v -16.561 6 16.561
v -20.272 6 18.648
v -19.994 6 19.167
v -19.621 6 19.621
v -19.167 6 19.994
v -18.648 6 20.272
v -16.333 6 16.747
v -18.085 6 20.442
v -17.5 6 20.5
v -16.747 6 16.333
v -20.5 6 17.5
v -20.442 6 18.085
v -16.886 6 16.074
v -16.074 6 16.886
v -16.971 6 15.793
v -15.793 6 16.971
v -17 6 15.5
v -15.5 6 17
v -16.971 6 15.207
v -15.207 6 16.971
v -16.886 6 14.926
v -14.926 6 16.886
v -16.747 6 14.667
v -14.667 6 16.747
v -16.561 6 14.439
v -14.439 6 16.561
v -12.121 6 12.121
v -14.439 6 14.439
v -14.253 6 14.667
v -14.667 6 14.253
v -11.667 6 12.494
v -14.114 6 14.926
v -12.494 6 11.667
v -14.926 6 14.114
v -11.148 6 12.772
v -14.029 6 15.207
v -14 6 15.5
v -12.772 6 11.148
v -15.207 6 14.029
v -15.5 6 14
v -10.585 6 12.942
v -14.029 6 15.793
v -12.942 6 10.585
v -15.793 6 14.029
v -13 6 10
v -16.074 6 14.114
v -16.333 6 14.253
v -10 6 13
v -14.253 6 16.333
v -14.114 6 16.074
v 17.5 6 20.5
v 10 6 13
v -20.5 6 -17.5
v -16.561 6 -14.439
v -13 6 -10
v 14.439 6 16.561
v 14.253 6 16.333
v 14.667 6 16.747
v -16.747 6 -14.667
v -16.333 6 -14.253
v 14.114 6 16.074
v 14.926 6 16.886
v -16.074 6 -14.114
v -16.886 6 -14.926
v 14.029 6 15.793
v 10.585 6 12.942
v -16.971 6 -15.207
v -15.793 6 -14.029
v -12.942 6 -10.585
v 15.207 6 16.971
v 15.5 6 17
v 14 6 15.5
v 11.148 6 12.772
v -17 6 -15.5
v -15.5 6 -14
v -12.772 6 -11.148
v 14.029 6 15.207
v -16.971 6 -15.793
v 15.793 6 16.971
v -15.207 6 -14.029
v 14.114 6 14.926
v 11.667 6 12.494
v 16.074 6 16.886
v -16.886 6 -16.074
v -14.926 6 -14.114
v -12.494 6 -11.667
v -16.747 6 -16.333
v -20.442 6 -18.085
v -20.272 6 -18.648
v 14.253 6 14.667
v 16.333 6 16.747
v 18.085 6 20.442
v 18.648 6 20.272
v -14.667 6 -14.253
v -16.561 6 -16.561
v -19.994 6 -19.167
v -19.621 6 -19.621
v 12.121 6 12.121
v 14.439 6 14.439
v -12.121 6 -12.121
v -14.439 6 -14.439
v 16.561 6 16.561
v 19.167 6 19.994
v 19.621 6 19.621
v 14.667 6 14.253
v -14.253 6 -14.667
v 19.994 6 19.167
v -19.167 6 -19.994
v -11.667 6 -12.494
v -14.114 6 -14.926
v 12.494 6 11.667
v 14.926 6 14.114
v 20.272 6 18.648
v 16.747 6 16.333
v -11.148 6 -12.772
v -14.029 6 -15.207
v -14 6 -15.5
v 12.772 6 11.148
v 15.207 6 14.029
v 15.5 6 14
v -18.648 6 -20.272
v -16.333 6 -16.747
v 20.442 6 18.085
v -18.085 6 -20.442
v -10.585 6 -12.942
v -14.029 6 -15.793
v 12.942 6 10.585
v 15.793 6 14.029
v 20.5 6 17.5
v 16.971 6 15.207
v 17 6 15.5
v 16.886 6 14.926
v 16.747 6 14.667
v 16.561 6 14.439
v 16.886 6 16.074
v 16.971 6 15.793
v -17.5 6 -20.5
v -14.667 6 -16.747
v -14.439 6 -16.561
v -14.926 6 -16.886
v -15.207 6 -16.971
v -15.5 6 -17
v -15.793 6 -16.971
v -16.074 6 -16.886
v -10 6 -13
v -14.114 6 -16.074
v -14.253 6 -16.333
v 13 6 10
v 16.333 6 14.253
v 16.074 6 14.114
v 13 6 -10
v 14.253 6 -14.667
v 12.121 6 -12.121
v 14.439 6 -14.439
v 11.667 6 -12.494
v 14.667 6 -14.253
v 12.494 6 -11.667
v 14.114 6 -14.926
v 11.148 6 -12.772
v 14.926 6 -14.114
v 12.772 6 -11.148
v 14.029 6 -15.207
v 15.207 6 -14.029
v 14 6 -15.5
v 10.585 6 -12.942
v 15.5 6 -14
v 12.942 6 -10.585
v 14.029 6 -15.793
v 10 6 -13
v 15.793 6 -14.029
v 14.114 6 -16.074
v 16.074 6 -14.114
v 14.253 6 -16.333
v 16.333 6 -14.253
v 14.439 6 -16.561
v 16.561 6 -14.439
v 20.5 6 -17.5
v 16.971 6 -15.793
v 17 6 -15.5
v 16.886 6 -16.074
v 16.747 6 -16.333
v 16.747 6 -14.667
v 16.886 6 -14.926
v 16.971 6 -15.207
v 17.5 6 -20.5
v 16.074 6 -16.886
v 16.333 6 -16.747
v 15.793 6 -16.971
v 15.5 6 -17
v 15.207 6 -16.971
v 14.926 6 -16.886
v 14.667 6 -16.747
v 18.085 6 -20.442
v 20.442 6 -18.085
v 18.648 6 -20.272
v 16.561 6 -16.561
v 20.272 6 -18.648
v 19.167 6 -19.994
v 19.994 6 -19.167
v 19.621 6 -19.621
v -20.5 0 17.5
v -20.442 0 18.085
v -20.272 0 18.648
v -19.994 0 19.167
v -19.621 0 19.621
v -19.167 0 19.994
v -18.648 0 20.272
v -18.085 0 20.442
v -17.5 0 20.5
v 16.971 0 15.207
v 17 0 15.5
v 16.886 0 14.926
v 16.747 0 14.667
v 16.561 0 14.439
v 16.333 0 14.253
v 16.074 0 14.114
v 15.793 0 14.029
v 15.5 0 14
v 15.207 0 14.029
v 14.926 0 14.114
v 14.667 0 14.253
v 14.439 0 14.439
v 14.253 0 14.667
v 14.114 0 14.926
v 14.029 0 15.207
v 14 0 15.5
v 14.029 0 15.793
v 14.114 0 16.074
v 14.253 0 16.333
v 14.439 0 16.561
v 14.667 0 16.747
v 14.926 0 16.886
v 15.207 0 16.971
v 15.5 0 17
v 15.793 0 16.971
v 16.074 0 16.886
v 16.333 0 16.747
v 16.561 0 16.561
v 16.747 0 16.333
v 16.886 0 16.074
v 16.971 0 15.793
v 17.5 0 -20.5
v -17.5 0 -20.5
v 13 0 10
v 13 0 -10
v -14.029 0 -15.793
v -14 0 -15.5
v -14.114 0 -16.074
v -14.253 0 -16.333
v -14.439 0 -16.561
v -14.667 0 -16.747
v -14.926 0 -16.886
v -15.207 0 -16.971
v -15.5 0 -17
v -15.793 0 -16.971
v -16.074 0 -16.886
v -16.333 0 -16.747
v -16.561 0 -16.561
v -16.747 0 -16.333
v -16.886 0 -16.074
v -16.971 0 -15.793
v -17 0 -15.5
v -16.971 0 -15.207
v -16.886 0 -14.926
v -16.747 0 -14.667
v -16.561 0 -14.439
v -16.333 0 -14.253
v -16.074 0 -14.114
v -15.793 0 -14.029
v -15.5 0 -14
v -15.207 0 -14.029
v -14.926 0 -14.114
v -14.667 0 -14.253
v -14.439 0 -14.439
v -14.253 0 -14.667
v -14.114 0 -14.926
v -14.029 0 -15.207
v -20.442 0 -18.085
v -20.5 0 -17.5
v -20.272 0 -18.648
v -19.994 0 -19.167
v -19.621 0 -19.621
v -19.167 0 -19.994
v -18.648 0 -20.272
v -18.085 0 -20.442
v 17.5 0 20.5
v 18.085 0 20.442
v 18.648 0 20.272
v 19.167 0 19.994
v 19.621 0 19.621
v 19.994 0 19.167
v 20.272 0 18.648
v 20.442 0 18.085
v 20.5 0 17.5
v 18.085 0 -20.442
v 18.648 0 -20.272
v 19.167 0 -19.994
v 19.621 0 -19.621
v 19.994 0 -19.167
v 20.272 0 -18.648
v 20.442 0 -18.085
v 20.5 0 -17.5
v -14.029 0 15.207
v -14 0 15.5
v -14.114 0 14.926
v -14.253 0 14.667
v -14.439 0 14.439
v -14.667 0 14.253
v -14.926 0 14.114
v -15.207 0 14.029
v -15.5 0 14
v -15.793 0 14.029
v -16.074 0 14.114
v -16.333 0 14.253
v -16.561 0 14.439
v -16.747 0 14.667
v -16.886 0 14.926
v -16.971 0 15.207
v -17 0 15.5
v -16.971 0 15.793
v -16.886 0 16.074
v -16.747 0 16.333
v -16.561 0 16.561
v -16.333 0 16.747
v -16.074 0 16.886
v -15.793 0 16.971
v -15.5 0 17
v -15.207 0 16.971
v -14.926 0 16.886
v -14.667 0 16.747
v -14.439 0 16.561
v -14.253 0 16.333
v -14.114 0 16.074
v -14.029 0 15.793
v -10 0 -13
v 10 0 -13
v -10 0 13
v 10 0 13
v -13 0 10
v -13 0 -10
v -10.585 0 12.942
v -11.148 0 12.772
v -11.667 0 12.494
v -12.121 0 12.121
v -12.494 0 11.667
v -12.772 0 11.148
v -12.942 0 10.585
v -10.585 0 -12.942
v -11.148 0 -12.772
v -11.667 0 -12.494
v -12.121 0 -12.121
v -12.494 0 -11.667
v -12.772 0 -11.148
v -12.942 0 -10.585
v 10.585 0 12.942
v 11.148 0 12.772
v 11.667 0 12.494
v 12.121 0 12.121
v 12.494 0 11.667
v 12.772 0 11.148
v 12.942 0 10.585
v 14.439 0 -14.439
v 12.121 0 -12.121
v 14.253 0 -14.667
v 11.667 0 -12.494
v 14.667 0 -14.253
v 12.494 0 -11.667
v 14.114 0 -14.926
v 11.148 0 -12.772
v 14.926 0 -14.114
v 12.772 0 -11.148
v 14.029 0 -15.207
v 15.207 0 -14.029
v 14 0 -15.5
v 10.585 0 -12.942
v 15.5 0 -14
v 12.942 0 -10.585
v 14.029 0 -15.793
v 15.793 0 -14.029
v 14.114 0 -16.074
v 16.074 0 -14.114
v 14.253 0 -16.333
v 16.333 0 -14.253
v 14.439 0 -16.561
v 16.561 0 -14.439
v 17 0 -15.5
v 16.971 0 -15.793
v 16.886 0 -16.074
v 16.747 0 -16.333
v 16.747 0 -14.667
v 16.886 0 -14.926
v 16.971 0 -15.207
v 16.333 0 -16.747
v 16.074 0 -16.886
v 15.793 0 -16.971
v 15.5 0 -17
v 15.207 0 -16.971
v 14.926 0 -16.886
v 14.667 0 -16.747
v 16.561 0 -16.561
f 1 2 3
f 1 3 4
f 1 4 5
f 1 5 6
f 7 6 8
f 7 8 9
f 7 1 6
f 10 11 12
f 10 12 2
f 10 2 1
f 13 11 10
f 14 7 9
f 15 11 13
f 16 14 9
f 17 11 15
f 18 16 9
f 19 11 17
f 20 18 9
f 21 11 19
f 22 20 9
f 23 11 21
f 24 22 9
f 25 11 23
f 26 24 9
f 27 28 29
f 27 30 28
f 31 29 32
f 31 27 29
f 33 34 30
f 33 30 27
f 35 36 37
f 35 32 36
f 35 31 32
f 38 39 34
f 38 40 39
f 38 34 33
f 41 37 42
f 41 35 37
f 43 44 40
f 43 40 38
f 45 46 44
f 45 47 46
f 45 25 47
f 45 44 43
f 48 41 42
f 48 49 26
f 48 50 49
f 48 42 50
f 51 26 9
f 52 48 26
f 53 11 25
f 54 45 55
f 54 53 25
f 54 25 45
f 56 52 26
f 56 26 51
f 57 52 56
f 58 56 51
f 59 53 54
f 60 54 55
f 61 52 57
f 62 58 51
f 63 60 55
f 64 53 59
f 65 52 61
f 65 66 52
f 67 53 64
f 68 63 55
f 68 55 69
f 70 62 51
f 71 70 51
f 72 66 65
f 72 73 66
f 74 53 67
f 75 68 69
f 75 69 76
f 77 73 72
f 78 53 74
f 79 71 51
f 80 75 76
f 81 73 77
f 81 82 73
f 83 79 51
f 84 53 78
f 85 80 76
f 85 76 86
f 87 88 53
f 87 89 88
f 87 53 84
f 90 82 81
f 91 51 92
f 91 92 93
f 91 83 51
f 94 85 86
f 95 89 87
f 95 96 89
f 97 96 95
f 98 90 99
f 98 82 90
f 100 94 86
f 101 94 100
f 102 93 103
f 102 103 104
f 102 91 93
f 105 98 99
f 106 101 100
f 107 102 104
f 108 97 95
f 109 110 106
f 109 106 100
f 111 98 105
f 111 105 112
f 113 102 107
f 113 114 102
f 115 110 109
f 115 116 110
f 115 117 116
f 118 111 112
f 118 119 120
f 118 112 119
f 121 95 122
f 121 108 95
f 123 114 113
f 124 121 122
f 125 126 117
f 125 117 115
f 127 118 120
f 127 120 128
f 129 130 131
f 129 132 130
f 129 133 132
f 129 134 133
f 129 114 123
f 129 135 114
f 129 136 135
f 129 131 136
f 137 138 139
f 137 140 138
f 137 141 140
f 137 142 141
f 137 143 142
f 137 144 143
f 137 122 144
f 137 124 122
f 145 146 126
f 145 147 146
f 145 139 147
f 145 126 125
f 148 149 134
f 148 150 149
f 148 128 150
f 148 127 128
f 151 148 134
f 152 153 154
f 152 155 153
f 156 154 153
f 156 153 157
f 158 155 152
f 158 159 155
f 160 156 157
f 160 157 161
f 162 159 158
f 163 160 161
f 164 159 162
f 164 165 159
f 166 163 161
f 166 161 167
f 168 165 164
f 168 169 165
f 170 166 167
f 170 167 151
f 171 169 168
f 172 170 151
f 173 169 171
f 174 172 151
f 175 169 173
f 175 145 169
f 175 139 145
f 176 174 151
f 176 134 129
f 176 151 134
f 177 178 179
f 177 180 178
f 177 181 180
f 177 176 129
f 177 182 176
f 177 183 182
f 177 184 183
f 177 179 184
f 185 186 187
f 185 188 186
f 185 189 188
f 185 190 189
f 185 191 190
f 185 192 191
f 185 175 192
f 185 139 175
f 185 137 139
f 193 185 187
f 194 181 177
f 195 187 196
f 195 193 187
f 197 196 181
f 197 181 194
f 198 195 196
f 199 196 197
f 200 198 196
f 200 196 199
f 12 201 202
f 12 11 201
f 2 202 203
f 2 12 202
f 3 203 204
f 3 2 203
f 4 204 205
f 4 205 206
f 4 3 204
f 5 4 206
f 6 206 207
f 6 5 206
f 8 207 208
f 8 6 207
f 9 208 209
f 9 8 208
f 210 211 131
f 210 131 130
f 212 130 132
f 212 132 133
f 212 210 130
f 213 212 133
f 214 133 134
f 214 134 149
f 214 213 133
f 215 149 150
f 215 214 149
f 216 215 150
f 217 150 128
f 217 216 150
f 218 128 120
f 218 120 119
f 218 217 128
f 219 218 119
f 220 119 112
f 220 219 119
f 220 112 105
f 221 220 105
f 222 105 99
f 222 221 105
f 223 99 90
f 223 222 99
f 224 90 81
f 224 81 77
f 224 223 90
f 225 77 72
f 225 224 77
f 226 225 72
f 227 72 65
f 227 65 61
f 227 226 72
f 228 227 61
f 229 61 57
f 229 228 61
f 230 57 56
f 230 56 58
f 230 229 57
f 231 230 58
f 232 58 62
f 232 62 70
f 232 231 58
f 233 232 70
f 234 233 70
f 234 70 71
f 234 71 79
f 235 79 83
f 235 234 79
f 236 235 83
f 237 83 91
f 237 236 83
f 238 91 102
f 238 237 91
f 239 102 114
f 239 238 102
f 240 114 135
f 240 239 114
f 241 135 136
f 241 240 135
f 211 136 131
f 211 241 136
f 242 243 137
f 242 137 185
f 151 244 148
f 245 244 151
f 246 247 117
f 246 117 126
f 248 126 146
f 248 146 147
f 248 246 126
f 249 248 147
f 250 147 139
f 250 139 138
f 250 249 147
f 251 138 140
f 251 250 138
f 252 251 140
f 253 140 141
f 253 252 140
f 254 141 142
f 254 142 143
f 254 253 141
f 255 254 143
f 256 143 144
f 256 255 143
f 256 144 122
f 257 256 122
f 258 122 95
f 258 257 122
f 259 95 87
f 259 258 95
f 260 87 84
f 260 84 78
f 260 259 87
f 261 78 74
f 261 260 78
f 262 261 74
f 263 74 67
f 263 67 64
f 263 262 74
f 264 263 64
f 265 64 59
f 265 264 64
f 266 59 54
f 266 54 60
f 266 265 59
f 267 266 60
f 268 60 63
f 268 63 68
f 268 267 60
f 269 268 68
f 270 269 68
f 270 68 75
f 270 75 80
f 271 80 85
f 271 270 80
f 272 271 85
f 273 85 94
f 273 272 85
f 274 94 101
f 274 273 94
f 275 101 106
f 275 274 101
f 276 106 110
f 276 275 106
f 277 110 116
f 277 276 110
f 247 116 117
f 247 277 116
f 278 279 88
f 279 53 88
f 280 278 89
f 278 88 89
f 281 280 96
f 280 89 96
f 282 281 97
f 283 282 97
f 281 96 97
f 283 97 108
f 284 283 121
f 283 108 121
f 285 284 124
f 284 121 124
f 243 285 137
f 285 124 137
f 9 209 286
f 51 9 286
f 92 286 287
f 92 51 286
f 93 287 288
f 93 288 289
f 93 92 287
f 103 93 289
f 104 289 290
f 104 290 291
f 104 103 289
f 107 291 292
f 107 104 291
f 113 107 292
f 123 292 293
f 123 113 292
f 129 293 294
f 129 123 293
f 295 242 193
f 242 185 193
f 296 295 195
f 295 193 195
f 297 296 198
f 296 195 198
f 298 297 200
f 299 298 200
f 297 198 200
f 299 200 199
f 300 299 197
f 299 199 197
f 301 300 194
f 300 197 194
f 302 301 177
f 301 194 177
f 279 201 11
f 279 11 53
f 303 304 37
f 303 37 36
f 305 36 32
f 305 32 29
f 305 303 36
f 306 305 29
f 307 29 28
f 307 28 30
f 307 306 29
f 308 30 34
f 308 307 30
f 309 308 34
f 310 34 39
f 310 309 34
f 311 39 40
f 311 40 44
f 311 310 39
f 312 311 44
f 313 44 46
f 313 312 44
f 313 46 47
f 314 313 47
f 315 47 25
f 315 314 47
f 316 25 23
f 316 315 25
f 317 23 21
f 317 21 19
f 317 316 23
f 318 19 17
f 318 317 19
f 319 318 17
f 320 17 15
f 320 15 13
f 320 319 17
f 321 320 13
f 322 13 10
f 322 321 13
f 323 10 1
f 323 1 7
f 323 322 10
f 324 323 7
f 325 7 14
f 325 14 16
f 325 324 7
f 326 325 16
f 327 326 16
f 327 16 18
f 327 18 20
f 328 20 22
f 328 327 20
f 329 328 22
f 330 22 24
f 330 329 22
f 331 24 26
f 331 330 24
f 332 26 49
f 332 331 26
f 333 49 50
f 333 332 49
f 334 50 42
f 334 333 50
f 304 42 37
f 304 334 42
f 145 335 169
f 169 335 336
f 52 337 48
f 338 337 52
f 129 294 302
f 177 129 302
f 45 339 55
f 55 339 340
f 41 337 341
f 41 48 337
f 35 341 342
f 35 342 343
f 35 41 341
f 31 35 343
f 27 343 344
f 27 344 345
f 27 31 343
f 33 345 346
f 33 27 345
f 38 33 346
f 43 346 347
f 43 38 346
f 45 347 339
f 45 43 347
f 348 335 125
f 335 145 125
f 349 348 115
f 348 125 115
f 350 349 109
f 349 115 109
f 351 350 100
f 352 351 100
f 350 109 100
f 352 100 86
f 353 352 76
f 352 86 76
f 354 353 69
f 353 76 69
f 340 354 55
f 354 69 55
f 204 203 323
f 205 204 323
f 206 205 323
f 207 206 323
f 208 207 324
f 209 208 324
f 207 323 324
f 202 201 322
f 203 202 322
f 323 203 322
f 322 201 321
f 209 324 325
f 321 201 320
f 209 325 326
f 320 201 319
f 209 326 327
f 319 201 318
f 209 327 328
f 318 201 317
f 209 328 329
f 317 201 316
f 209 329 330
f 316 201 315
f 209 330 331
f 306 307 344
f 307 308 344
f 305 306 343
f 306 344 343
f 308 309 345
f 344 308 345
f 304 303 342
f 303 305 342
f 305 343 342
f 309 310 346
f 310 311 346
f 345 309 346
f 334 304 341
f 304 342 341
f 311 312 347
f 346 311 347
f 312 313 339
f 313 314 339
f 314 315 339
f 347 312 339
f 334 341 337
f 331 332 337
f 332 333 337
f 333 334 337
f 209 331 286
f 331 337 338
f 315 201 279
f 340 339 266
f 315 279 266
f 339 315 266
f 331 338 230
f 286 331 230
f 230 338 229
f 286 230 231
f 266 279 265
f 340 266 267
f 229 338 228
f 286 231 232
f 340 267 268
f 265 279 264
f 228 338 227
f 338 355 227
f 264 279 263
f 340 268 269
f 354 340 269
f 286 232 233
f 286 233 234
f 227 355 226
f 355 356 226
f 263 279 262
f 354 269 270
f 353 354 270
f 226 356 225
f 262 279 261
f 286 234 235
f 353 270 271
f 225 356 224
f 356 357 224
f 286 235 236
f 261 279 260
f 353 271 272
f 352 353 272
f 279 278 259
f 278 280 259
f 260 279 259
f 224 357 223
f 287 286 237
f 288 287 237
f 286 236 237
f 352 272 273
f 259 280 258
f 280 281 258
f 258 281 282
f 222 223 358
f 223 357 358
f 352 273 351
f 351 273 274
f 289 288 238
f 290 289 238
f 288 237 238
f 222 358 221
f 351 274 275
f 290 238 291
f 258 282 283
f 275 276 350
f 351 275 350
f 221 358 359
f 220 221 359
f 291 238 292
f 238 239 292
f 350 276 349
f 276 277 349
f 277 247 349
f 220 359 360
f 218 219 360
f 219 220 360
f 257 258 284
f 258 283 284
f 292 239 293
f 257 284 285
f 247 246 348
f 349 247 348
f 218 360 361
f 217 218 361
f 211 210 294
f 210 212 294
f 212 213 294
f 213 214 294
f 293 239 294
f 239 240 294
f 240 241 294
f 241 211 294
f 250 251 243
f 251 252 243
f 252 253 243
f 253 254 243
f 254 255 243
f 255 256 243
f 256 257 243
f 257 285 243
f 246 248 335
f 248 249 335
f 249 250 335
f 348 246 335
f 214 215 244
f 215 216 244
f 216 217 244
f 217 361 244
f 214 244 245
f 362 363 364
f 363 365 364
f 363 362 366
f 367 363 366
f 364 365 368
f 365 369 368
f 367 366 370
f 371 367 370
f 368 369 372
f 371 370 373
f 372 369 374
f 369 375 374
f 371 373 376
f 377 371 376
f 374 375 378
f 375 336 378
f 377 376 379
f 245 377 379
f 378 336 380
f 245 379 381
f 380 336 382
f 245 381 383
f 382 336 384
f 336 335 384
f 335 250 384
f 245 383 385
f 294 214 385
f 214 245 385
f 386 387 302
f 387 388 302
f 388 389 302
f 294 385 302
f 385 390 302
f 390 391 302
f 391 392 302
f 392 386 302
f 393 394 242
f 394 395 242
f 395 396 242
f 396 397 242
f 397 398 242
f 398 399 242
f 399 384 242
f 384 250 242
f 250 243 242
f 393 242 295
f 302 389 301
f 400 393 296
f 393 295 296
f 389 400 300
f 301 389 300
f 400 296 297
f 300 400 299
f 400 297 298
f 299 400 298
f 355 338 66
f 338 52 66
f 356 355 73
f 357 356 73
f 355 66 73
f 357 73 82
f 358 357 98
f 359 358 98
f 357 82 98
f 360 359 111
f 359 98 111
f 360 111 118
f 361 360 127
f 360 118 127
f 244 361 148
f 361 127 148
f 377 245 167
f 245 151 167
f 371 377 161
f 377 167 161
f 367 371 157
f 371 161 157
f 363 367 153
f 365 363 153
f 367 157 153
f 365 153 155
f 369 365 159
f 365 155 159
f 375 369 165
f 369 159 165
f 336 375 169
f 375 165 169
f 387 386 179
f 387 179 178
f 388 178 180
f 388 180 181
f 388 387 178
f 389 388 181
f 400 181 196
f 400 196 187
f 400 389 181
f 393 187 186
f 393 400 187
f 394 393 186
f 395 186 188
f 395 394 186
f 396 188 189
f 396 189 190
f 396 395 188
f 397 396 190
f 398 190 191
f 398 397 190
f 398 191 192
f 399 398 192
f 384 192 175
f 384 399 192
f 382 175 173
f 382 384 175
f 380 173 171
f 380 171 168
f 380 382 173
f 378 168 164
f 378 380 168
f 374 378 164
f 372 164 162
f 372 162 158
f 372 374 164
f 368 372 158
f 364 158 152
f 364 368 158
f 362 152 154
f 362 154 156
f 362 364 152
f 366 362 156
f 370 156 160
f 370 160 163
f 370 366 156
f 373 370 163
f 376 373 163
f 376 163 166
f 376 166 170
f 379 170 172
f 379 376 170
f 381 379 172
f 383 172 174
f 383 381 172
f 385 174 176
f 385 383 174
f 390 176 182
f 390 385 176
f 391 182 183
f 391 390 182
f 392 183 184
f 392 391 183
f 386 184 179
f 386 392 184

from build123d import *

# Parameters (mm, degrees)
SKETCH1_W           = 41
SKETCH1_H           = 41
BOSS_EXTRUDE1_DEPTH = 6
SKETCH2_R           = 1.5
CUT_EXTRUDE1_DEPTH  = 6
SKETCH3_W           = 26
SKETCH3_H           = 26
CUT_EXTRUDE2_DEPTH  = 6
FILLET1_R           = 3


with BuildPart() as part:
    # Sketch1 → Boss-Extrude1 (new body)
    with BuildSketch(Plane(origin=(0, 0, 0), x_dir=(1, 0, 0), z_dir=(0, 1, 0))):
        Rectangle(SKETCH1_W, SKETCH1_H)
    extrude(amount=BOSS_EXTRUDE1_DEPTH)

    # Sketch2 → Cut-Extrude1 (cut)
    with BuildSketch(Plane(origin=(0, 0, 0), x_dir=(1, 0, 0), z_dir=(0, 1, 0))):
        with Locations((-15.5, 15.5)):
            Circle(SKETCH2_R)
        with Locations((15.5, 15.5)):
            Circle(SKETCH2_R)
        with Locations((-15.5, -15.5)):
            Circle(SKETCH2_R)
        with Locations((15.5, -15.5)):
            Circle(SKETCH2_R)
    extrude(amount=CUT_EXTRUDE1_DEPTH, mode=Mode.SUBTRACT)

    # Sketch3 → Cut-Extrude2 (cut)
    with BuildSketch(Plane(origin=(0, 0, 0), x_dir=(1, 0, 0), z_dir=(0, 1, 0))):
        Rectangle(SKETCH3_W, SKETCH3_H)
    extrude(amount=CUT_EXTRUDE2_DEPTH, mode=Mode.SUBTRACT)

    # Fillet1
    fillet1_edges = [part.edges().sort_by_distance(p)[0] for p in [
        (13, 3, 13),
        (13, 3, -13),
        (-13, 3, -13),
        (-13, 3, 13),
        (20.5, 3, 20.5),
        (-20.5, 3, 20.5),
        (-20.5, 3, -20.5),
        (20.5, 3, -20.5),
    ]]
    fillet(fillet1_edges, radius=FILLET1_R)


solid = part.part
